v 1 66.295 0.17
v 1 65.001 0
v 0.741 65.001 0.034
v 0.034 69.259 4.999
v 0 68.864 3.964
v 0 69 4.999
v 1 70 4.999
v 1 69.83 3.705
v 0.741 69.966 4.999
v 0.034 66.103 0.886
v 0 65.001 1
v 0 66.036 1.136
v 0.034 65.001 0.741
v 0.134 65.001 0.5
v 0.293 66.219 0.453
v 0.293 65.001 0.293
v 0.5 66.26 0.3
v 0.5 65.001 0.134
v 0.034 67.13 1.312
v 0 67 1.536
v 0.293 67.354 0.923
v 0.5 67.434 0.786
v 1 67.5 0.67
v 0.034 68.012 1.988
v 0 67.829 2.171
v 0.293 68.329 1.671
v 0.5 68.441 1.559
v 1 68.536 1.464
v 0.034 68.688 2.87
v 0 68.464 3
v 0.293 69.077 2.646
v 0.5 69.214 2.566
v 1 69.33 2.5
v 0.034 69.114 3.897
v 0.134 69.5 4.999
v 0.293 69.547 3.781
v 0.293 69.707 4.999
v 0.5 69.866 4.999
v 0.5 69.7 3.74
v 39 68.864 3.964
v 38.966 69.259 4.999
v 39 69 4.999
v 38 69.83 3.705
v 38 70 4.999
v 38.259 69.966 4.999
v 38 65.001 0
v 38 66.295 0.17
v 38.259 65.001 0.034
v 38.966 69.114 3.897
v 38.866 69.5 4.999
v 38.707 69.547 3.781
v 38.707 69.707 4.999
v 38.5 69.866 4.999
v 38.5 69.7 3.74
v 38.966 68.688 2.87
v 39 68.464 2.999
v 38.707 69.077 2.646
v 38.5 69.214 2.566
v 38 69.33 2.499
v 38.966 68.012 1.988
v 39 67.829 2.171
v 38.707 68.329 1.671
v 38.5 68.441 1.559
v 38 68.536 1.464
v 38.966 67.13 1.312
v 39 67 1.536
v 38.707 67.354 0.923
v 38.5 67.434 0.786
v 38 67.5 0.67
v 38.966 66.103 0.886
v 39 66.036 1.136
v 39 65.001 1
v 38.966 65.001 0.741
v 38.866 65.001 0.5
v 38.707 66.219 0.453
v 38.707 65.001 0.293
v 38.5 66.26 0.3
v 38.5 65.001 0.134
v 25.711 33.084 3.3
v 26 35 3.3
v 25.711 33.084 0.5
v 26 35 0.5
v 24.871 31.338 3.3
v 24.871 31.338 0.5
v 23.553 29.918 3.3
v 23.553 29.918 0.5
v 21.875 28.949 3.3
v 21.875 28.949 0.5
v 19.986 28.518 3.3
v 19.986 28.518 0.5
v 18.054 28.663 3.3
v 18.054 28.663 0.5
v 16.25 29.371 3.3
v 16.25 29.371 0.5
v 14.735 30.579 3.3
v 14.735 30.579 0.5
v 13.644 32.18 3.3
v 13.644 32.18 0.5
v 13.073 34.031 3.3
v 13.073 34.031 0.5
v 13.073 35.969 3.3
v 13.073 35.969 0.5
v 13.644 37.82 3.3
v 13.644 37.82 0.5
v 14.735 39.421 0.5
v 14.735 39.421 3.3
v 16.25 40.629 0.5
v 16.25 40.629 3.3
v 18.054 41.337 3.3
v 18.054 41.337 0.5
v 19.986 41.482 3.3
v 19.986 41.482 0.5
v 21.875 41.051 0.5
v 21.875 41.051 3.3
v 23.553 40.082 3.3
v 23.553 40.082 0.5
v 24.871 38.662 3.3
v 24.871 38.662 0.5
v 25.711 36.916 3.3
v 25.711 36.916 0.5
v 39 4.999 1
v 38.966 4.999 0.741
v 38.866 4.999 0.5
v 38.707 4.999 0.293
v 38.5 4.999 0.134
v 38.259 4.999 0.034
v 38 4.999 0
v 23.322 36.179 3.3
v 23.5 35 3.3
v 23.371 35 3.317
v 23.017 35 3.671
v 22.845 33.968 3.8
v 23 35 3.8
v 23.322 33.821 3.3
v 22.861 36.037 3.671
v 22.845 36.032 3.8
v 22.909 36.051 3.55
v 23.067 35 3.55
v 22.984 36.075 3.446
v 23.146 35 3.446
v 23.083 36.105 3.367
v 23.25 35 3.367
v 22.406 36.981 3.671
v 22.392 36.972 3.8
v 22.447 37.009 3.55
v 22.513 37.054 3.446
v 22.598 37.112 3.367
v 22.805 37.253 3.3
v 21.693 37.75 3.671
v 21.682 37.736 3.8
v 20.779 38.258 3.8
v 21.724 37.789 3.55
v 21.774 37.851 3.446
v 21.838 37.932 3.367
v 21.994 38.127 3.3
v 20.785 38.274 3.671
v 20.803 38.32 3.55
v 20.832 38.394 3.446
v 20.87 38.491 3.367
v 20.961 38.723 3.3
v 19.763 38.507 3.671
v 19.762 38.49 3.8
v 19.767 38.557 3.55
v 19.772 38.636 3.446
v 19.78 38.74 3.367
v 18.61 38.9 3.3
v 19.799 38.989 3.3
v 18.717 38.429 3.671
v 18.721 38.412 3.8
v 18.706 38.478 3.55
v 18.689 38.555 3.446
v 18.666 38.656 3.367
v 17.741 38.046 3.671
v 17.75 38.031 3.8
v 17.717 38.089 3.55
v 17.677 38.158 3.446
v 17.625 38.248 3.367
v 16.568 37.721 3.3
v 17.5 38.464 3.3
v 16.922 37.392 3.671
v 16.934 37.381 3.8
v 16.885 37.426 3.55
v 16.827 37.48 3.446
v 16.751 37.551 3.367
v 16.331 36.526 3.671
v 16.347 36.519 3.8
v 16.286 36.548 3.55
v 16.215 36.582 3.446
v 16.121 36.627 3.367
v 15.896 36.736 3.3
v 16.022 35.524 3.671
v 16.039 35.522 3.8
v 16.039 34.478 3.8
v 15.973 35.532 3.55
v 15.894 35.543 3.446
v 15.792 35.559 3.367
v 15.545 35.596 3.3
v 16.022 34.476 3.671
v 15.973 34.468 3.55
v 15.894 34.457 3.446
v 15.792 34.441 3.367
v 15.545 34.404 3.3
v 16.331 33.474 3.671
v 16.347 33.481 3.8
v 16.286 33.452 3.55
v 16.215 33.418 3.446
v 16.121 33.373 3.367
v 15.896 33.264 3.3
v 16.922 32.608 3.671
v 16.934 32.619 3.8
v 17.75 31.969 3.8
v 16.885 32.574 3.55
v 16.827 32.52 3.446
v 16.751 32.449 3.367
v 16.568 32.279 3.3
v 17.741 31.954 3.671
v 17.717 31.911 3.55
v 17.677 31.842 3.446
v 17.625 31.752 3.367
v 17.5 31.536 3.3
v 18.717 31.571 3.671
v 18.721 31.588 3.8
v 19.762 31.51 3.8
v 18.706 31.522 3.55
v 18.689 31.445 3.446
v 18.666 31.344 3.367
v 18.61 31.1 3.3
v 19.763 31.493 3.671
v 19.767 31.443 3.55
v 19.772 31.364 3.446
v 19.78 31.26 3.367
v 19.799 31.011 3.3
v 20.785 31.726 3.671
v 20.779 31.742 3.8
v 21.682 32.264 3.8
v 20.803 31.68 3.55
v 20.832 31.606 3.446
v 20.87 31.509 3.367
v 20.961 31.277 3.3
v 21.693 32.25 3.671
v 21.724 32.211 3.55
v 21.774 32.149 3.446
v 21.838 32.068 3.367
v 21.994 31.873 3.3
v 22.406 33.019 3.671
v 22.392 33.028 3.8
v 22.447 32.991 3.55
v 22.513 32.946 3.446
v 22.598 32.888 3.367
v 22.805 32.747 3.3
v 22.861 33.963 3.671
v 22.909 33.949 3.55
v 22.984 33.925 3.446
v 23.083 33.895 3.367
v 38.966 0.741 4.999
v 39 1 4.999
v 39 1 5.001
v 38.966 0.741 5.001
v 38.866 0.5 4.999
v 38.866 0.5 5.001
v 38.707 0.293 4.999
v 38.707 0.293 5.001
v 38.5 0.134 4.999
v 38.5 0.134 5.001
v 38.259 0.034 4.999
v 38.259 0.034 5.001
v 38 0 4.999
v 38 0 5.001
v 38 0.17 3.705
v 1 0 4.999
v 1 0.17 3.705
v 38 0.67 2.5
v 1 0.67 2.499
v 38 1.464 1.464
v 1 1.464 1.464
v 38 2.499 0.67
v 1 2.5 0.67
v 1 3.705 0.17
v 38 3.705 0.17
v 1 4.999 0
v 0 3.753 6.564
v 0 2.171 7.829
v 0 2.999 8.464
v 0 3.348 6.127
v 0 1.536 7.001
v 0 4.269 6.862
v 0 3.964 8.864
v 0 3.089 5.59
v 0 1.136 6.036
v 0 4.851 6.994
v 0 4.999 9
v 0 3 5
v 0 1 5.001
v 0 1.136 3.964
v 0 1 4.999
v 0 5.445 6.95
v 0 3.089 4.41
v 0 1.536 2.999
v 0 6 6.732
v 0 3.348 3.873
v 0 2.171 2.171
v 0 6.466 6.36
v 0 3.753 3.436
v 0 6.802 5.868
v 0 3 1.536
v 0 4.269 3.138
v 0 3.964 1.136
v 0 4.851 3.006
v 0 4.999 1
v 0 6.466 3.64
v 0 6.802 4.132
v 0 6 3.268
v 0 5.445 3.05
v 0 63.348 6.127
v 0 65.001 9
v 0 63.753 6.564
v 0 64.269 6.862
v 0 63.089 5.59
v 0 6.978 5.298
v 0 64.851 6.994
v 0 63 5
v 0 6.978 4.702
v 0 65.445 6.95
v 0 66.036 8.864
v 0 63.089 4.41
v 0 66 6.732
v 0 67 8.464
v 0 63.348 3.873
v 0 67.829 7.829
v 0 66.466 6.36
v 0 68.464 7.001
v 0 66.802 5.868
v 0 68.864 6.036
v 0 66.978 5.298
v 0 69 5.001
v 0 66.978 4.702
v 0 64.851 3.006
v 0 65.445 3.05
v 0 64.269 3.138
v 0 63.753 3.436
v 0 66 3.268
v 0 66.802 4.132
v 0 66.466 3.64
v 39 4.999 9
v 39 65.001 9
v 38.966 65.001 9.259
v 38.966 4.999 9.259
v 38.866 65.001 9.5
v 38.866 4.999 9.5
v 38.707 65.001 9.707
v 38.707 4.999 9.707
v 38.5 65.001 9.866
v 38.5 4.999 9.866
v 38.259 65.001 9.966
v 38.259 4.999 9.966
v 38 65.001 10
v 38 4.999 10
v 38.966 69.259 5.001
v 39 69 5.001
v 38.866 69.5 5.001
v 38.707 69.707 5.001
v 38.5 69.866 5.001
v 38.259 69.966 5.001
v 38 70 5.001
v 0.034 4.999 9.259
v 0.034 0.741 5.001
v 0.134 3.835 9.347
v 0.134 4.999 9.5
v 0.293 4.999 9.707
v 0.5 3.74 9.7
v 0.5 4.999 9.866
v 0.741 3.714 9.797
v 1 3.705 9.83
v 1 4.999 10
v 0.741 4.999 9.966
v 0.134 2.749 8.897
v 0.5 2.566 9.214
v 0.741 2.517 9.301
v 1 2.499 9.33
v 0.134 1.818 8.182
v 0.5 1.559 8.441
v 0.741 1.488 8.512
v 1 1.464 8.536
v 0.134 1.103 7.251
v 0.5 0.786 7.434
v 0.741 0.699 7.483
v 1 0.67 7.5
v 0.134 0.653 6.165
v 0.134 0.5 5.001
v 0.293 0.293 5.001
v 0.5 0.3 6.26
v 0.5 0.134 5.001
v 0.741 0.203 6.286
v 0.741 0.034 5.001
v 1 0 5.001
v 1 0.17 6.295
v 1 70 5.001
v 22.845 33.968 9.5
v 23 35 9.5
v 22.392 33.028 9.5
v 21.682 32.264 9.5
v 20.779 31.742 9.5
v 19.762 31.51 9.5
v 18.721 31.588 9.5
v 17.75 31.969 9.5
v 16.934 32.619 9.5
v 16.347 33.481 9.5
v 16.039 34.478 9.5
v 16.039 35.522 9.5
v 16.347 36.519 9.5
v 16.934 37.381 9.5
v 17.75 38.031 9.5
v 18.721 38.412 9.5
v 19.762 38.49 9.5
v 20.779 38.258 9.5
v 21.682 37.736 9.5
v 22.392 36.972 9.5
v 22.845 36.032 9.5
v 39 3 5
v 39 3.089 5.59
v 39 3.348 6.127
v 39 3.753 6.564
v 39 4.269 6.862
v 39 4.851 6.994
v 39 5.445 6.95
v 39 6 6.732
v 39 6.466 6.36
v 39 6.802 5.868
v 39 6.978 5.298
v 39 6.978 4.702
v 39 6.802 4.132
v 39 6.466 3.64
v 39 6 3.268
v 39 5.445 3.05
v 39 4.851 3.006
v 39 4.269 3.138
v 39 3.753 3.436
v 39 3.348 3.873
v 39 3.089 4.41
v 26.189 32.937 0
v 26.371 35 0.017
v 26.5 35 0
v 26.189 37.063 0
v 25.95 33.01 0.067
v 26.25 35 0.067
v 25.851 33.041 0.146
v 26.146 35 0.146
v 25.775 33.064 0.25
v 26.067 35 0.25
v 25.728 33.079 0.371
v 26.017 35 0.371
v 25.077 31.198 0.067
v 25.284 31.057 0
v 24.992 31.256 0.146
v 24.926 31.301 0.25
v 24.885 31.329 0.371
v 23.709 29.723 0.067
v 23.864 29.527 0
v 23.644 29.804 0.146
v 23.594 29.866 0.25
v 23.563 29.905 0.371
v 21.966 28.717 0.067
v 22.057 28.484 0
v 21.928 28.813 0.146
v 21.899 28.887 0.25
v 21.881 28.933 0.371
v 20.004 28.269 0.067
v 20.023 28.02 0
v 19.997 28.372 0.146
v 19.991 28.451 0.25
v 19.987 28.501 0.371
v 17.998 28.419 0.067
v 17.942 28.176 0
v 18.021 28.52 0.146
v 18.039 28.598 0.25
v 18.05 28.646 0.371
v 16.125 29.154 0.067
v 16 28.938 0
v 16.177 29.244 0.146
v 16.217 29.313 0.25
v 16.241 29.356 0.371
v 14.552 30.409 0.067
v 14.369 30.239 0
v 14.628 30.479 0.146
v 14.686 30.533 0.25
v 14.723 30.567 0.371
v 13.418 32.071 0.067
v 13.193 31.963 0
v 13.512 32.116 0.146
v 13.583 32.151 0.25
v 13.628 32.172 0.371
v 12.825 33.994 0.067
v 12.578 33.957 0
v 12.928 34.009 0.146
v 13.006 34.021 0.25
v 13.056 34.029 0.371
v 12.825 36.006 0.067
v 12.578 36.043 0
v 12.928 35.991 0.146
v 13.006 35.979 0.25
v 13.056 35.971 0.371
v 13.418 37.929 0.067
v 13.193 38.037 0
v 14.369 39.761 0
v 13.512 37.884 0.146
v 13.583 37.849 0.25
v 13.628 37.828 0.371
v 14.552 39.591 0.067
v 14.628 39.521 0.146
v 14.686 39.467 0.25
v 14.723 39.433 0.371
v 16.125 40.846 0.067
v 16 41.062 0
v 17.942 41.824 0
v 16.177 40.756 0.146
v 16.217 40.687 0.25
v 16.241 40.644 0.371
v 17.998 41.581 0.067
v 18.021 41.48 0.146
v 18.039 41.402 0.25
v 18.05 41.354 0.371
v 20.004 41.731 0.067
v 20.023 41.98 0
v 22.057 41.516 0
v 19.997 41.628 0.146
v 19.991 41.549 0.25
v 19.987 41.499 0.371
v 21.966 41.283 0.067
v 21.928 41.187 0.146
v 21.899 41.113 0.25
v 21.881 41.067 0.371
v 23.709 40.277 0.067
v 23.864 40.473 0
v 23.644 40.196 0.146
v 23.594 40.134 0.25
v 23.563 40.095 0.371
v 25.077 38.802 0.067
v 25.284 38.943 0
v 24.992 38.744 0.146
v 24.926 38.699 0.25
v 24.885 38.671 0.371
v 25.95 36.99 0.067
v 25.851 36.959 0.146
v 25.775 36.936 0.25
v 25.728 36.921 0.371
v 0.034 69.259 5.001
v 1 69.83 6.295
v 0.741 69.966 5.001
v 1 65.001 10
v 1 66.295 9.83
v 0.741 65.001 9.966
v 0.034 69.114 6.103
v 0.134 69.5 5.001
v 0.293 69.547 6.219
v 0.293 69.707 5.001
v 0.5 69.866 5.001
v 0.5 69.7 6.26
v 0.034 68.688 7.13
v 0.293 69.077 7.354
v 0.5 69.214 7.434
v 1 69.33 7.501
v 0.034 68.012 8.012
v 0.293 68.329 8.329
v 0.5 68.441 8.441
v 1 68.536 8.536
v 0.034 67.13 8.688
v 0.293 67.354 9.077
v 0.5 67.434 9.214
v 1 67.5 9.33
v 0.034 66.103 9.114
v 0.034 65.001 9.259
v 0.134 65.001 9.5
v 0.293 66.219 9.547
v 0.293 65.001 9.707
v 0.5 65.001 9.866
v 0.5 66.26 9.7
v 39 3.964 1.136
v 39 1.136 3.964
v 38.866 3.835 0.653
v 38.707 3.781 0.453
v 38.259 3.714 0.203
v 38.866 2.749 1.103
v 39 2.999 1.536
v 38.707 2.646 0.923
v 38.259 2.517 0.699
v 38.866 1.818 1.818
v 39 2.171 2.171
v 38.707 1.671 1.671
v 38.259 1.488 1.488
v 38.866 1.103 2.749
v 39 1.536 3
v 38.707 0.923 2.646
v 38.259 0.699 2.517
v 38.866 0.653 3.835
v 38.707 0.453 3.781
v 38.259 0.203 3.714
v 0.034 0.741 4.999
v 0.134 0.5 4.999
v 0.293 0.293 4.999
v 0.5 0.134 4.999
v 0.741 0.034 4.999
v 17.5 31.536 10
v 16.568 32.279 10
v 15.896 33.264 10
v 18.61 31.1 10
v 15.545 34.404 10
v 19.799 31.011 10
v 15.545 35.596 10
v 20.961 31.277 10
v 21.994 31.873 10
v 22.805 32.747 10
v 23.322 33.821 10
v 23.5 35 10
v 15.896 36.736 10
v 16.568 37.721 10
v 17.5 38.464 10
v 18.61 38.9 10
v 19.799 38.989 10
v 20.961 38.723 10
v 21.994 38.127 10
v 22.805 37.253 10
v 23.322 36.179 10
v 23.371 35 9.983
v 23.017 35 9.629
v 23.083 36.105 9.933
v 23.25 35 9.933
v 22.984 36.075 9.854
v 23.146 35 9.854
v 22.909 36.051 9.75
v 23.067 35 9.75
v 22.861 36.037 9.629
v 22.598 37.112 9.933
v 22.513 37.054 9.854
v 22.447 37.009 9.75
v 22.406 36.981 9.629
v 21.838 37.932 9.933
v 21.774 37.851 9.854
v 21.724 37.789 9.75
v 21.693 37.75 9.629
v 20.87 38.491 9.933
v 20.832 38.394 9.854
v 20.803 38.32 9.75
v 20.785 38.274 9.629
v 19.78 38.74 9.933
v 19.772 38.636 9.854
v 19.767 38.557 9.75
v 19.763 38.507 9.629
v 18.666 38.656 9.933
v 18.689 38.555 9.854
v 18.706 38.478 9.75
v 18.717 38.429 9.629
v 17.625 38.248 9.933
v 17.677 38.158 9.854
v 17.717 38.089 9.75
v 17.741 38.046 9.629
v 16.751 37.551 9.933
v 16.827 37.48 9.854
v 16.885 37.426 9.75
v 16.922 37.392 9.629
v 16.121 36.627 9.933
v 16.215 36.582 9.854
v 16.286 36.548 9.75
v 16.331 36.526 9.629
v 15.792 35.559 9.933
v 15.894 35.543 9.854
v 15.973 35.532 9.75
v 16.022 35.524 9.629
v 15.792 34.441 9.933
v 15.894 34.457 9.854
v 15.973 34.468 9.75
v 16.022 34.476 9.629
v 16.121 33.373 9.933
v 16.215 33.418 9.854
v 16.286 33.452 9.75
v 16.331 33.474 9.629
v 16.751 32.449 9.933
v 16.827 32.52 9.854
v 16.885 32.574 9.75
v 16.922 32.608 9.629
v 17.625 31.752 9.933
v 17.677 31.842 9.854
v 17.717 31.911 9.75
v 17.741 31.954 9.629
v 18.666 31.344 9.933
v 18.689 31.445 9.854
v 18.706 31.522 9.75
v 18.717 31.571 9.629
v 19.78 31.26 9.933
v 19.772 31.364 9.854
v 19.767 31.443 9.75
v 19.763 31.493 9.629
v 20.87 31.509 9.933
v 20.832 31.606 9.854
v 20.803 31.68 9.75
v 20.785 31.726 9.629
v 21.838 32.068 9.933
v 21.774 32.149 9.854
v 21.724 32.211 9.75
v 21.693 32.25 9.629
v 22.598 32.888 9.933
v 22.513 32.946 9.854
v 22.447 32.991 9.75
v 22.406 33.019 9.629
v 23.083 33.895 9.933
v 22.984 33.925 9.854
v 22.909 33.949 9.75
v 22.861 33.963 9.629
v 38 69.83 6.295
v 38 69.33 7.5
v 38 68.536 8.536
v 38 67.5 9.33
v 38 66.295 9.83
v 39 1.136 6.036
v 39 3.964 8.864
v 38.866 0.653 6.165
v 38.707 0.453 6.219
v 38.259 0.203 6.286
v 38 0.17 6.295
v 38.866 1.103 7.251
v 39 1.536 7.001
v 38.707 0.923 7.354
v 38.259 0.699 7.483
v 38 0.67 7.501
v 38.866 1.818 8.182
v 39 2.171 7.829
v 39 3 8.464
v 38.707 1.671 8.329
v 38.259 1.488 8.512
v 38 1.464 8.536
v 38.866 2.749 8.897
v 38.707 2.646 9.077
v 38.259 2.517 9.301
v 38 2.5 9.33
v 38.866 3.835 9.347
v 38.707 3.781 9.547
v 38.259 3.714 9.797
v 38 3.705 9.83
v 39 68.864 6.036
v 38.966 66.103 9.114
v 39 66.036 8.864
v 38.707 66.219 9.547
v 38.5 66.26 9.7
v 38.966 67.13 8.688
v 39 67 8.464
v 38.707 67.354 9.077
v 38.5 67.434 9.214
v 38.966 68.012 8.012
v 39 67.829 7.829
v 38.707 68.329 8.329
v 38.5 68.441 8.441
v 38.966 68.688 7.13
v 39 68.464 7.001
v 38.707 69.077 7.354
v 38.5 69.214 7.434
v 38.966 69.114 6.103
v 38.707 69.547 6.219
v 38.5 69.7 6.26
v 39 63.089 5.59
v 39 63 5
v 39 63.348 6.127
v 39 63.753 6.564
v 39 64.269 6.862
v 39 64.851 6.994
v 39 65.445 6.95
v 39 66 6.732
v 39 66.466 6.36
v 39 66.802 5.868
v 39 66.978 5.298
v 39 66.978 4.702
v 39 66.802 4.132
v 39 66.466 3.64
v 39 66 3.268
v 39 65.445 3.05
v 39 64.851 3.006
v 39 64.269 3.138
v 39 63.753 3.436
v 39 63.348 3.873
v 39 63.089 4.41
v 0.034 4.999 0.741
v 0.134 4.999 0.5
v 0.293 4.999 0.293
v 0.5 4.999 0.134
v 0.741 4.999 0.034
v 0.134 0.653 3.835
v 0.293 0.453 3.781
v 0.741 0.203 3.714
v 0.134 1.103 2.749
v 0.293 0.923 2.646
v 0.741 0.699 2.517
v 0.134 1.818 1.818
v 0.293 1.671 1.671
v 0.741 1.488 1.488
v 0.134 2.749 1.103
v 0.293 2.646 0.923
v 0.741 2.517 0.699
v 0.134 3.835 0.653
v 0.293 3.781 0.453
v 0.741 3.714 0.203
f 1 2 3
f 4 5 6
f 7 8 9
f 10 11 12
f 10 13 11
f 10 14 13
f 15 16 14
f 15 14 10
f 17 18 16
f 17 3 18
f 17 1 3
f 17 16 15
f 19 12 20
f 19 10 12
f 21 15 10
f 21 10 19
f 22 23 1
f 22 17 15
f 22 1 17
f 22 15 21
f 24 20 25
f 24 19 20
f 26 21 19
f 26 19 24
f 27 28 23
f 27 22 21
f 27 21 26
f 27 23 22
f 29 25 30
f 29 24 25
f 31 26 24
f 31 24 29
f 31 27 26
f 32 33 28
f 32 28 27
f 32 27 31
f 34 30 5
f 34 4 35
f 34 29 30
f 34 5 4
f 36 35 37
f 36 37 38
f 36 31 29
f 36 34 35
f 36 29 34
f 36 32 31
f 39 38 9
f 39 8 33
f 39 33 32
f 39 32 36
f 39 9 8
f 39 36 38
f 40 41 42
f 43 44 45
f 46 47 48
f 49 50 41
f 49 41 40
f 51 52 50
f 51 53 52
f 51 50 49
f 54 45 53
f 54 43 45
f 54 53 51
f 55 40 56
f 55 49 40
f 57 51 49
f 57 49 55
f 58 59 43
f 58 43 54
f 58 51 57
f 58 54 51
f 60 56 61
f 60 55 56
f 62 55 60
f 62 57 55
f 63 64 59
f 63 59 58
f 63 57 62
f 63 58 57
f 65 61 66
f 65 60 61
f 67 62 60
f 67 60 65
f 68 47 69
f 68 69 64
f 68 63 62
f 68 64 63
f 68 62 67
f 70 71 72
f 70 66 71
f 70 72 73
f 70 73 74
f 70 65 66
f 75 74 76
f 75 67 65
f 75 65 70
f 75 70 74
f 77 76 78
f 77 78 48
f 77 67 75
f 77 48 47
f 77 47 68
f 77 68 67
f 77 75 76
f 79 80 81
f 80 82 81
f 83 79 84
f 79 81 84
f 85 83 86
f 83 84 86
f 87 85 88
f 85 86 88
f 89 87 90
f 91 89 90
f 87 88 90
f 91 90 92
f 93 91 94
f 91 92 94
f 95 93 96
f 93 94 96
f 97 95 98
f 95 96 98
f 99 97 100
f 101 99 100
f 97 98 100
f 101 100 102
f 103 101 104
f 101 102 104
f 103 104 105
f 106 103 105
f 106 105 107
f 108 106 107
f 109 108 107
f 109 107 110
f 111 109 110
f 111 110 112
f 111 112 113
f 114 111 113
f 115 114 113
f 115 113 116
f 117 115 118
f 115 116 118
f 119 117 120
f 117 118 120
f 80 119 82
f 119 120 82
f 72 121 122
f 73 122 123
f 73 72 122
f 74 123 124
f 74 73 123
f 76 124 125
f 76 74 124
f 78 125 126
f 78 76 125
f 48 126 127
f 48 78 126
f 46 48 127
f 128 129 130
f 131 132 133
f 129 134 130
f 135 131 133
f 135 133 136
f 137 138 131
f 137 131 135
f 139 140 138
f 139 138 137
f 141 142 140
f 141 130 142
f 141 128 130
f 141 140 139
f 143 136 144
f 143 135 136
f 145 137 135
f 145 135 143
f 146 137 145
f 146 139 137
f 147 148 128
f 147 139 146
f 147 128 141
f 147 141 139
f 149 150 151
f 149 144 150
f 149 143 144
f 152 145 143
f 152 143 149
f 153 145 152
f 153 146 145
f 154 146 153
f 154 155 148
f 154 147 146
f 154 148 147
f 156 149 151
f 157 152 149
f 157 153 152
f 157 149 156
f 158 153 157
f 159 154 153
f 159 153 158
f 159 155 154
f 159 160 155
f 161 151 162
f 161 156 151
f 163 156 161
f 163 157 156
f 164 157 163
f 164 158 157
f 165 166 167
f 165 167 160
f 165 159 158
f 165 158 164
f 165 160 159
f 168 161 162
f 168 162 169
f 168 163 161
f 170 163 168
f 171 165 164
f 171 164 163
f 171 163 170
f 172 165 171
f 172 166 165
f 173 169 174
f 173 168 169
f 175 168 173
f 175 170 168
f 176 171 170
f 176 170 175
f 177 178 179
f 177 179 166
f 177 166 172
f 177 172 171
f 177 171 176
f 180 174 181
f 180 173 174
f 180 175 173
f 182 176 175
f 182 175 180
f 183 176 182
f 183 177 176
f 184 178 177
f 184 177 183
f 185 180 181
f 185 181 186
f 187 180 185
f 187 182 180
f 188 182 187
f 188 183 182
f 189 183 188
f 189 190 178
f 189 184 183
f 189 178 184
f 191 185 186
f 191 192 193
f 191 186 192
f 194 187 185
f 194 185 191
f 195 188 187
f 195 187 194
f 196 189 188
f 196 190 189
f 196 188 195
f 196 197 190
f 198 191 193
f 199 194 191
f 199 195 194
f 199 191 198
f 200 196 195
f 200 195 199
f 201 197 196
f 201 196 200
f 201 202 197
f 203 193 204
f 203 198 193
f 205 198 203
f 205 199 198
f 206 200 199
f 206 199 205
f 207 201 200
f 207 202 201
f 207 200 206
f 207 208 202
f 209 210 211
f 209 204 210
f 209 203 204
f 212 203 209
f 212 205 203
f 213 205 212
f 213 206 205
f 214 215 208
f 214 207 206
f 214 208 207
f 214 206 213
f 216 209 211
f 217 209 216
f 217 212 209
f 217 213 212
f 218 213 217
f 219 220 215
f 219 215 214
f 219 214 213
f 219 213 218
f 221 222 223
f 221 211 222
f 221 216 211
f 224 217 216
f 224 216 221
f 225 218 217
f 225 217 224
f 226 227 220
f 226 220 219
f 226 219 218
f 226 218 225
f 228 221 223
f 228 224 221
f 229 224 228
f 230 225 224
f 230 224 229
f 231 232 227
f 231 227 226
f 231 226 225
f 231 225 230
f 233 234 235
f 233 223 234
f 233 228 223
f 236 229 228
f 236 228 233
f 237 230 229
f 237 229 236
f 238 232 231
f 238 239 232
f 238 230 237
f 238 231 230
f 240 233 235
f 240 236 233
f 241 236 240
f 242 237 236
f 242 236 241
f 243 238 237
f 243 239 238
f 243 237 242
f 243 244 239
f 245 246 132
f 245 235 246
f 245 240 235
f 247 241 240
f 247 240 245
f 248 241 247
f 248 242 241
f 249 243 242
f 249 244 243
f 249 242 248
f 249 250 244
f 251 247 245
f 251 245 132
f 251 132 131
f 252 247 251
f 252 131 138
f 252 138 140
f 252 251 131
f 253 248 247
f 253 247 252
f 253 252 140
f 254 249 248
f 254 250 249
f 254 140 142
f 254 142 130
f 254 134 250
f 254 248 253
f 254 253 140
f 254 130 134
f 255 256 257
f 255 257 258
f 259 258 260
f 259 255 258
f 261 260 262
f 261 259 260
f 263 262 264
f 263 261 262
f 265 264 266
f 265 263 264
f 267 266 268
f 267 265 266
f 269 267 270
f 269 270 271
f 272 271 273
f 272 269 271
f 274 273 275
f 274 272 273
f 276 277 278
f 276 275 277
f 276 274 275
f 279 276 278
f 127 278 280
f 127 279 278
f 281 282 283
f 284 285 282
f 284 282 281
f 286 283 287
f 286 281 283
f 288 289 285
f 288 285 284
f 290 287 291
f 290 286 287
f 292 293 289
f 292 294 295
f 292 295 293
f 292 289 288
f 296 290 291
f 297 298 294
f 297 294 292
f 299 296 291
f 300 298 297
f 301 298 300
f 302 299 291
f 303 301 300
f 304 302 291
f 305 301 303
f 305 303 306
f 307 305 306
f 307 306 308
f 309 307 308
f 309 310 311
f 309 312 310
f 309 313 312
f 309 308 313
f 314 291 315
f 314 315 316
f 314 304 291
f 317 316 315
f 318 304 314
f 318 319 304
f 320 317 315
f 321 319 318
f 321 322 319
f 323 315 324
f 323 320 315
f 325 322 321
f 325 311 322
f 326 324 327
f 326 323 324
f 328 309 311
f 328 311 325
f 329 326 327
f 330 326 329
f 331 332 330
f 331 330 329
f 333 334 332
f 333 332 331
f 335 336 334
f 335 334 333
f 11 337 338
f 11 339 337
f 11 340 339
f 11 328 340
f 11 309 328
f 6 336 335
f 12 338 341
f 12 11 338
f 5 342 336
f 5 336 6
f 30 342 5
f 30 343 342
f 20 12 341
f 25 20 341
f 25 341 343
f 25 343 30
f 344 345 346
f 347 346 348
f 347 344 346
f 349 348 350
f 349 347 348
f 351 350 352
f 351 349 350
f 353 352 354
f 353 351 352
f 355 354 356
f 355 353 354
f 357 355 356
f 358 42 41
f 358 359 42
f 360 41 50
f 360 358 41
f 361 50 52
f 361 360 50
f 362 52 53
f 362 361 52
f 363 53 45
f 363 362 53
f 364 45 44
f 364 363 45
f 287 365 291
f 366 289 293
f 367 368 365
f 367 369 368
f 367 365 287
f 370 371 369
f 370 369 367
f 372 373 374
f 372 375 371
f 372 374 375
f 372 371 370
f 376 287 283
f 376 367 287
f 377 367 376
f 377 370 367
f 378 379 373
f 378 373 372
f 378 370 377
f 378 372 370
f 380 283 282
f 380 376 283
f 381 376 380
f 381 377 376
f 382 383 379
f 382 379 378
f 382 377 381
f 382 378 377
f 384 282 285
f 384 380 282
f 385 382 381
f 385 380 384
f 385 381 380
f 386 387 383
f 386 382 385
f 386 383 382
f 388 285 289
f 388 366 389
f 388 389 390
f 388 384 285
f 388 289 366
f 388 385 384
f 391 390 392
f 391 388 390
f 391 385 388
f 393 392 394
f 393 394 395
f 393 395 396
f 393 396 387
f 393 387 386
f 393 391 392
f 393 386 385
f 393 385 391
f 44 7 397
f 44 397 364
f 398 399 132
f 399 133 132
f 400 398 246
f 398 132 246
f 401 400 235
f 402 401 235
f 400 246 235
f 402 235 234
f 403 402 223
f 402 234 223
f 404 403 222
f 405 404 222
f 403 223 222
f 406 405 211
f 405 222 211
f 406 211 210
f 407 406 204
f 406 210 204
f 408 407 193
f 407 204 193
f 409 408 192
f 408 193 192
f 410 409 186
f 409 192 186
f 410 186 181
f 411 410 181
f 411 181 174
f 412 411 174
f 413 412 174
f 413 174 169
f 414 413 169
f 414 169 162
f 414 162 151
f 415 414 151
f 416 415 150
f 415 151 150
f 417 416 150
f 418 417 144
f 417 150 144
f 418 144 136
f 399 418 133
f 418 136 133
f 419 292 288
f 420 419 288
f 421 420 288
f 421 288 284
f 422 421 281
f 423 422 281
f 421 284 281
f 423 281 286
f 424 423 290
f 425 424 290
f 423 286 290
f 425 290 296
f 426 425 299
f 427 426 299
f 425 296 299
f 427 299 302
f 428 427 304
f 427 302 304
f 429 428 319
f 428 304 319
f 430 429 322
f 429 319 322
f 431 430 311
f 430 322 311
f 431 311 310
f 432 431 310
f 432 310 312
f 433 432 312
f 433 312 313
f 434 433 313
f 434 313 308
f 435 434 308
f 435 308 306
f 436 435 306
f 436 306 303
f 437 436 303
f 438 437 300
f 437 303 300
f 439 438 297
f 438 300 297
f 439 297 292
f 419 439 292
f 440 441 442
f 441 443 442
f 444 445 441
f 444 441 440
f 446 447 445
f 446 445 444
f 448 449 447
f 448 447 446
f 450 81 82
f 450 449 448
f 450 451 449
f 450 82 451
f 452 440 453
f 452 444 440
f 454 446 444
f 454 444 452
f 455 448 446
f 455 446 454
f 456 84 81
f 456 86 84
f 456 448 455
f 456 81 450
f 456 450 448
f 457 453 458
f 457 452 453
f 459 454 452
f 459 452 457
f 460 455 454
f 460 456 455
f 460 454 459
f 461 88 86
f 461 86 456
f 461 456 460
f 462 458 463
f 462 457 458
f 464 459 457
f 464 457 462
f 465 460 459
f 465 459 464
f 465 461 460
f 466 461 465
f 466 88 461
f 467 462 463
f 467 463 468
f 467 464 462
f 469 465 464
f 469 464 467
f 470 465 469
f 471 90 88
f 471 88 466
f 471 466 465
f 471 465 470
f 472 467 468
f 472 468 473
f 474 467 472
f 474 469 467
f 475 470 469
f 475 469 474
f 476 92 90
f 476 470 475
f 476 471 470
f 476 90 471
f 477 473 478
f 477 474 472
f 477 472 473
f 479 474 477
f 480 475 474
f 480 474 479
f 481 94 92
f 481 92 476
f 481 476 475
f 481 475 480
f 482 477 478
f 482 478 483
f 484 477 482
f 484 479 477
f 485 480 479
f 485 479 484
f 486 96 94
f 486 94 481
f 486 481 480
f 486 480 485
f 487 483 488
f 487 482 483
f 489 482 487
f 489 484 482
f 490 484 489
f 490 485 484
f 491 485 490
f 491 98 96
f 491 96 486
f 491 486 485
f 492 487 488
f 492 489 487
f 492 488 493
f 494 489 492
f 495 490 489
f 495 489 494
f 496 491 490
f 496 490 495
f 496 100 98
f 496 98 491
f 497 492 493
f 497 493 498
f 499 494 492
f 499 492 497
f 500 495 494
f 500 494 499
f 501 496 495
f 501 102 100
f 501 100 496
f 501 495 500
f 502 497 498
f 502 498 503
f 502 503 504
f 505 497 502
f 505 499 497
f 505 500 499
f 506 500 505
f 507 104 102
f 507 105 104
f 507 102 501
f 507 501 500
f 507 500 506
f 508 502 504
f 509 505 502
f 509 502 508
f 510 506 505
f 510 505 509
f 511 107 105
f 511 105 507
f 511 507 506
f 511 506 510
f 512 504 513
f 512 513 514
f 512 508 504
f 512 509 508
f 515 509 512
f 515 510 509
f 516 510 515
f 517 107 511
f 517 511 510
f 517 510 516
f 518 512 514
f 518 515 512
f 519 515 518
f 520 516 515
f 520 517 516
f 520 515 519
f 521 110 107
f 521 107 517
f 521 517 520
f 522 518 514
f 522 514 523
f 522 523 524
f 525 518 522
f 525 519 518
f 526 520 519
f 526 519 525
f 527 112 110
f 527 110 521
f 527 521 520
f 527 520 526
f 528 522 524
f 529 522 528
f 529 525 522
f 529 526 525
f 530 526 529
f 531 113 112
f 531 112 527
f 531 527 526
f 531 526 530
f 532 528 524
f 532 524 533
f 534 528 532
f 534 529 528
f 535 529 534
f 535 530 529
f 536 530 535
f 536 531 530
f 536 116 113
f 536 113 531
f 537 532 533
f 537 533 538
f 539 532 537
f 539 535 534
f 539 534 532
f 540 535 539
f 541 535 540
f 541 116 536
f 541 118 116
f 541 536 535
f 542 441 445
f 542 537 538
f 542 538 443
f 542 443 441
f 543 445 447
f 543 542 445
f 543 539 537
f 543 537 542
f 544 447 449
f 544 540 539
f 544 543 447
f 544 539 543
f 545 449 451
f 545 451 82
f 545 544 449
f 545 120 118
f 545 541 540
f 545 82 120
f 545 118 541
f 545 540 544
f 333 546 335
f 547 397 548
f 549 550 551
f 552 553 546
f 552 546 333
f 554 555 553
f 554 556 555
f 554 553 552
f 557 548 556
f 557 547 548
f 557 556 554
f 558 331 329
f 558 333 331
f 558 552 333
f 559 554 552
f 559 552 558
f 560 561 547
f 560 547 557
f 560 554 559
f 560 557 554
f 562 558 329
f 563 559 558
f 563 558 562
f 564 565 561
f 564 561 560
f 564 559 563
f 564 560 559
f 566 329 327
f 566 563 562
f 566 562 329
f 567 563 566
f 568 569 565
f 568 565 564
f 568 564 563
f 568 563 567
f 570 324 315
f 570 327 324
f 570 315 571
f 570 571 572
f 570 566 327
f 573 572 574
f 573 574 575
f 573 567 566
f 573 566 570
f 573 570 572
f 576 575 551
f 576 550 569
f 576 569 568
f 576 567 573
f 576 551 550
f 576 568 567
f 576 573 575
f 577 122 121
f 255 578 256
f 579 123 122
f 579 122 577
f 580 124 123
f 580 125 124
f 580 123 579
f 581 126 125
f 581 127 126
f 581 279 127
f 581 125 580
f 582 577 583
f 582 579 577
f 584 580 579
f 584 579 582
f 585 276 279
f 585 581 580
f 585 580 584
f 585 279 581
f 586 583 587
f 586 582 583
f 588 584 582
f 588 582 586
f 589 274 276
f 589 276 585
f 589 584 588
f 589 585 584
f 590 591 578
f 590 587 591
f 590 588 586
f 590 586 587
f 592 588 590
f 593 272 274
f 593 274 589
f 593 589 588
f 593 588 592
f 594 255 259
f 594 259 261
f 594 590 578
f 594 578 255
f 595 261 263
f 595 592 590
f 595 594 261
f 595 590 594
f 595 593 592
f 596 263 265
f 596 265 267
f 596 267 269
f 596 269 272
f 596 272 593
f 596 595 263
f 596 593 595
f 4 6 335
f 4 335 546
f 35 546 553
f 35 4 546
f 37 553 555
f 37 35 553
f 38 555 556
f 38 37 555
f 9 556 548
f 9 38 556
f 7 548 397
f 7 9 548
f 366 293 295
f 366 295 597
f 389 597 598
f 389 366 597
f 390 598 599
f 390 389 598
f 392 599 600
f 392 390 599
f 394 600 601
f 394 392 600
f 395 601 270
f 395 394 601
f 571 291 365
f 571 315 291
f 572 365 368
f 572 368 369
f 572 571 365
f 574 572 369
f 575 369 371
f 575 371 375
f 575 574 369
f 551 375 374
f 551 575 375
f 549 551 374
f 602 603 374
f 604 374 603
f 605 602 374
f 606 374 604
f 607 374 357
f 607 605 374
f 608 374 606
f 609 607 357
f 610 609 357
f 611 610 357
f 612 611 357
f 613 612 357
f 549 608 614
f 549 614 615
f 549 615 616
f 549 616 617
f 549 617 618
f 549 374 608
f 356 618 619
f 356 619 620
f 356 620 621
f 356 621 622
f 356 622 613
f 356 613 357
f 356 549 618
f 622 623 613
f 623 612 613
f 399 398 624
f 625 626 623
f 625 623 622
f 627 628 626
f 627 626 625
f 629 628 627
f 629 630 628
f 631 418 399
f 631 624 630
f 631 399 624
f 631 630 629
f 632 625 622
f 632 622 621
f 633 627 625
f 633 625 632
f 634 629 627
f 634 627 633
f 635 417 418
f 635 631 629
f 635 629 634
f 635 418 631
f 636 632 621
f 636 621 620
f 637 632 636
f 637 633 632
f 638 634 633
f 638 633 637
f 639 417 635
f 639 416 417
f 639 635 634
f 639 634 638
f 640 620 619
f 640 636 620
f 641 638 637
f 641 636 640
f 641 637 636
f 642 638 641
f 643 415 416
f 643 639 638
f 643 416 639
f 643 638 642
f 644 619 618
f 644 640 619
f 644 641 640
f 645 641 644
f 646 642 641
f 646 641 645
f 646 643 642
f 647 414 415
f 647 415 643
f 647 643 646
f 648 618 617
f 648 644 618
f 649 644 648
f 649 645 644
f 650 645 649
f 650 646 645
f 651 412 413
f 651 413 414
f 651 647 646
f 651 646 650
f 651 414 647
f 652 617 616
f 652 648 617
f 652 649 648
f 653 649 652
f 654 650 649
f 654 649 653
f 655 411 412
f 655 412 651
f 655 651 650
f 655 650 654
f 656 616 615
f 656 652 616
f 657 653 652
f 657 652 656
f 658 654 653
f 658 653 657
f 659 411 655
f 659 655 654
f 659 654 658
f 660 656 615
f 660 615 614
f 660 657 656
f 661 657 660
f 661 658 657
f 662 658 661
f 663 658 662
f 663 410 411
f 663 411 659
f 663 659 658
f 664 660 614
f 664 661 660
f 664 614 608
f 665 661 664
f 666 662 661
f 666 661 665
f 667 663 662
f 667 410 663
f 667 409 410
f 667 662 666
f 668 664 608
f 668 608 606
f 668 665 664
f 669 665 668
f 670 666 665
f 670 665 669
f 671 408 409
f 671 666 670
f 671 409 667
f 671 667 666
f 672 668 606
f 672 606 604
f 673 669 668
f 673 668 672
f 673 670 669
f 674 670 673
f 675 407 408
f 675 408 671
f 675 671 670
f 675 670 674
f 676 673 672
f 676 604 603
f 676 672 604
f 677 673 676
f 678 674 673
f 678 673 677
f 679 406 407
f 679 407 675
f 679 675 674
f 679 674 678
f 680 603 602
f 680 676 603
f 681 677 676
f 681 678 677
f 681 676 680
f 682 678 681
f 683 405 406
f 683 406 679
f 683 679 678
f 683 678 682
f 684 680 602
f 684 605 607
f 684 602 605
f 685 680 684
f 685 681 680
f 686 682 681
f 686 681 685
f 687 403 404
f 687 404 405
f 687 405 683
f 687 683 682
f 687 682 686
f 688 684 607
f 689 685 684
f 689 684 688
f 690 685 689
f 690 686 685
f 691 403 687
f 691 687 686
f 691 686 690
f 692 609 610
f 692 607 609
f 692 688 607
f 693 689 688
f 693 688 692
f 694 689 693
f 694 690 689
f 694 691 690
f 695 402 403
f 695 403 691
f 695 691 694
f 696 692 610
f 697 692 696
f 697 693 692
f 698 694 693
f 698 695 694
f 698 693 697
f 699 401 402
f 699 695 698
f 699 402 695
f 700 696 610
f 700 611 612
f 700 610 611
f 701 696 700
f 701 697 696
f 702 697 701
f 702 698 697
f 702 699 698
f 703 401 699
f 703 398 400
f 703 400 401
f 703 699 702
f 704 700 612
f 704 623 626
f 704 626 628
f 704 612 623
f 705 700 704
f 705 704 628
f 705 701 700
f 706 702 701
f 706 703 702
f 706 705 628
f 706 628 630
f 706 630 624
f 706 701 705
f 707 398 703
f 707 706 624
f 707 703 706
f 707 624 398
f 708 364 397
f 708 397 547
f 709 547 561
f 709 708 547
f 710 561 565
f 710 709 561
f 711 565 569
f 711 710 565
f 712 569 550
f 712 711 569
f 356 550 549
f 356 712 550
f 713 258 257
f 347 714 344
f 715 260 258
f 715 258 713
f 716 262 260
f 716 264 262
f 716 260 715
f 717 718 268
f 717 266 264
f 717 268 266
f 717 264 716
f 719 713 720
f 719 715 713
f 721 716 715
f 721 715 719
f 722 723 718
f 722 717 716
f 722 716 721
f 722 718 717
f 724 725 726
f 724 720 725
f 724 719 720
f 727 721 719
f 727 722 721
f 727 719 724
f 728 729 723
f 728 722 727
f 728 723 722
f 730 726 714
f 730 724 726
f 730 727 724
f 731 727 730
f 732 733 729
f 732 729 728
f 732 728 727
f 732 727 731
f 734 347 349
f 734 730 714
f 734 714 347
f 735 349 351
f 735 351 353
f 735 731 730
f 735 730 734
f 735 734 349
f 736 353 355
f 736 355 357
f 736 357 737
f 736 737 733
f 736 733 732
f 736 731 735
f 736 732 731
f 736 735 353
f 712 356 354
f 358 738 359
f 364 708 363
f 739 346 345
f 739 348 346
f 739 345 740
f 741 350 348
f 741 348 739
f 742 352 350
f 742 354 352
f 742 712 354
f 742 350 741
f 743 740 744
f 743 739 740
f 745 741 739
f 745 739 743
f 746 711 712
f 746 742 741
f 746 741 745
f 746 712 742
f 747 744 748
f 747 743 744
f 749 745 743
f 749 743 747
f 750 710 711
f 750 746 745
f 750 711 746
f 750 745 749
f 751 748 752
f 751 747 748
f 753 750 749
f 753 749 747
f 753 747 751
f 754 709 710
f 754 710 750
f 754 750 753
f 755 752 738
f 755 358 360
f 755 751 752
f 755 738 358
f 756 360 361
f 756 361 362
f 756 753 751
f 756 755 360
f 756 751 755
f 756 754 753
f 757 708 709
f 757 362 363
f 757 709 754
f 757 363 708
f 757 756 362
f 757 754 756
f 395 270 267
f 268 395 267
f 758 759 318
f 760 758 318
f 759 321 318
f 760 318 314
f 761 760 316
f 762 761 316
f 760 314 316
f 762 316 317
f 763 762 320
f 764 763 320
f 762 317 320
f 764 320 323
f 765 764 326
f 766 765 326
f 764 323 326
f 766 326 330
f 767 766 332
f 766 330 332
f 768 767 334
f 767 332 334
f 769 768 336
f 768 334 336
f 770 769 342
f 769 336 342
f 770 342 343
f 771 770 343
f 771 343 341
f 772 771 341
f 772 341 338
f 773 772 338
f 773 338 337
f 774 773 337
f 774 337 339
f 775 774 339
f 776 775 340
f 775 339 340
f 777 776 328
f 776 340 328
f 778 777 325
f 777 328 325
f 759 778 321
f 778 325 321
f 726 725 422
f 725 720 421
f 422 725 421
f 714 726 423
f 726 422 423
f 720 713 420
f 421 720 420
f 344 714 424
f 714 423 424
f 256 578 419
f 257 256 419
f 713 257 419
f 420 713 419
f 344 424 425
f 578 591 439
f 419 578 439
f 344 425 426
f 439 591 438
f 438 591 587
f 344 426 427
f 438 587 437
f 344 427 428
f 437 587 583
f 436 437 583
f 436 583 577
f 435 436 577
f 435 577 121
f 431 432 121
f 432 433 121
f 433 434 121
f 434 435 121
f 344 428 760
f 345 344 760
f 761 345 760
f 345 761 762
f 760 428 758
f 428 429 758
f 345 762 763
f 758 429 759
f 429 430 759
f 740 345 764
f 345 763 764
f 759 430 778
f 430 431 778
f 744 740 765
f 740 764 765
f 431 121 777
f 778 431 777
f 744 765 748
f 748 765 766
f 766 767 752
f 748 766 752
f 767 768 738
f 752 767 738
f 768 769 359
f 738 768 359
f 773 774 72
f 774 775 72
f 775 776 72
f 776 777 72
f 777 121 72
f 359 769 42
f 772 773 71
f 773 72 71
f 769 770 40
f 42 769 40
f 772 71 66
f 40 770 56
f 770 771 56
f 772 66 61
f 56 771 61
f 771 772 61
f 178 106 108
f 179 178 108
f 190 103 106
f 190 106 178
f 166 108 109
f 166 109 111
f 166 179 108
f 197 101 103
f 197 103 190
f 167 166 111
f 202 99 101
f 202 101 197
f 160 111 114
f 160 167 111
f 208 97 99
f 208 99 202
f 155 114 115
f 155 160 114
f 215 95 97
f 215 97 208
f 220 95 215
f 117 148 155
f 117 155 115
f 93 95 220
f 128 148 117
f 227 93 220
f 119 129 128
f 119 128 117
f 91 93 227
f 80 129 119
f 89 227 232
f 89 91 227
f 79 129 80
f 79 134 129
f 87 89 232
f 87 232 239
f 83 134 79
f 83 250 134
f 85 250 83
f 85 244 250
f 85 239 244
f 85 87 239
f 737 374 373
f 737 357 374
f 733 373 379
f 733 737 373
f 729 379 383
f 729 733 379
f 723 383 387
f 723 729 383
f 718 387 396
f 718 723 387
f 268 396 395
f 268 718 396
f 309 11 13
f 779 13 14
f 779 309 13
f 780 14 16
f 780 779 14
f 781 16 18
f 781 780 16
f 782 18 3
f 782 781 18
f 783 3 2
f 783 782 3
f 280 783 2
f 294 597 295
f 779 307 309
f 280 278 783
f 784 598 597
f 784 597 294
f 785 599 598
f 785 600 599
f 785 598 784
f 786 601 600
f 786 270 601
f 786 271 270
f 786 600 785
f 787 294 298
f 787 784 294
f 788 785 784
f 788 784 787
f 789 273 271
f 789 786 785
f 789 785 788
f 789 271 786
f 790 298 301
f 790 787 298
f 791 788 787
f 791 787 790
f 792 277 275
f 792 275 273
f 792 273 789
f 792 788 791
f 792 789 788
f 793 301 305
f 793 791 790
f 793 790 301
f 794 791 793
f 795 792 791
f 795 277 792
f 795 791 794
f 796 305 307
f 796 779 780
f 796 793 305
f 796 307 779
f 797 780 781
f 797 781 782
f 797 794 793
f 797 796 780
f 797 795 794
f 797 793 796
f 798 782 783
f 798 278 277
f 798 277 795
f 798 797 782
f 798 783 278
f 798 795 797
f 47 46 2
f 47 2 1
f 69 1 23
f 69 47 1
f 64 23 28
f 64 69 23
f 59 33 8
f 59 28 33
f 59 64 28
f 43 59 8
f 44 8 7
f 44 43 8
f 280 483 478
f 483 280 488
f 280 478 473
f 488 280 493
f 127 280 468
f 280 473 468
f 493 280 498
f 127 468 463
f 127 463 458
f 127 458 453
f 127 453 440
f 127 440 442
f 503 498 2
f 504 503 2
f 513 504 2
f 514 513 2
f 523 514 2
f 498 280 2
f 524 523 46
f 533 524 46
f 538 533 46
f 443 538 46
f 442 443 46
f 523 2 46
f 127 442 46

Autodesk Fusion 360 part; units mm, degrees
sketch "Esboço1" plane through (0, 0, 0) normal (0, 0, 1) x (1, 0, 0)
  line L0 (0, 0) -> (39, 0)
  line L1 (39, 0) -> (39, 70)
  line L2 (0, 0) -> (0, 70)
  line L3 (0, 70) -> (39, 70)
  dimension "d1" = 39
  dimension "d2" = 70
extrude "Extrusão1" add sketch "Esboço1" along normal blind 10
sketch "Esboço3" plane through (0, 0, 0) normal (0, 0, -1) x (1, 0, 0)
  line L0 (39, 0) -> (0, 0)
  line L1 (0, 0) -> (0, -70)
  line L2 (0, -70) -> (39, -70)
  line L3 (39, -70) -> (39, 0)
  line L4 (39, 0) -> (39, -35) construction
  line L5 (39, -35) -> (0, -35) construction
  circle A0 centre (19.5, -35) radius 3.5
  dimension "d5" = 7
extrude "Extrusão2" cut sketch "Esboço3" against normal blind 10 contours A0
sketch "Esboço4" plane through (0, 0, 0) normal (0, 0, -1) x (1, 0, 0)
  circle A0 centre (19.5, -35) radius 3.5
  line L0 (39, 0) -> (0, 0)
  line L1 (0, 0) -> (0, -70)
  line L2 (0, -70) -> (39, -70)
  line L3 (39, -70) -> (39, 0)
  circle A1 centre (19.5, -35) radius 6.5
  dimension "d8" = 13
extrude "Extrusão3" cut sketch "Esboço4" against normal blind 3.3 contours A1
fillet "Arredondamento1" radius 5 2 edges at (19.5, 70, 10) (19.5, 70, 0)
sketch "Esboço5" plane through (0, 0, 0) normal (-1, 0, 0) x (0, -1, 0)
  arc A0 (-65, 10) -> (-65, 0) centre (-65, 5) ccw
  line L0 (-65, 0) -> (0, 0)
  line L1 (0, 0) -> (0, 10)
  line L2 (0, 10) -> (-65, 10)
  circle A1 centre (-65, 5) radius 2
  dimension "d13" = 4
extrude "Extrusão4" cut sketch "Esboço5" against normal blind 40 contours A1
fillet "Arredondamento2" radius 5 2 edges at (19.5, 0, 10) (19.5, 0, 0)
sketch "Esboço6" plane through (0, 0, 0) normal (-1, 0, 0) x (0, -1, 0)
  circle A0 centre (-65, 5) radius 2
  arc A1 (-5, 0) -> (-5, 10) centre (-5, 5) ccw
  line L0 (-5, 10) -> (-65, 10)
  arc A2 (-65, 10) -> (-65, 0) centre (-65, 5) ccw
  line L1 (-65, 0) -> (-5, 0)
  circle A3 centre (-5, 5) radius 2
  dimension "d18" = 4
extrude "Extrusão5" cut sketch "Esboço6" against normal blind 40 contours A3
fillet "Arredondamento3" radius 0.5 3 edges at (13.4399, 32.6495, 0) (16.2369, 36.2657, 3.3) (16.2369, 36.2657, 10)
fillet "Arredondamento4" radius 1 8 edges at (39, 70, 5) (39, 35, 10) (39, 0, 5) (39, 35, 0) (0, 35, 10) (0, 0, 5) (0, 35, 0) (0, 70, 5)
